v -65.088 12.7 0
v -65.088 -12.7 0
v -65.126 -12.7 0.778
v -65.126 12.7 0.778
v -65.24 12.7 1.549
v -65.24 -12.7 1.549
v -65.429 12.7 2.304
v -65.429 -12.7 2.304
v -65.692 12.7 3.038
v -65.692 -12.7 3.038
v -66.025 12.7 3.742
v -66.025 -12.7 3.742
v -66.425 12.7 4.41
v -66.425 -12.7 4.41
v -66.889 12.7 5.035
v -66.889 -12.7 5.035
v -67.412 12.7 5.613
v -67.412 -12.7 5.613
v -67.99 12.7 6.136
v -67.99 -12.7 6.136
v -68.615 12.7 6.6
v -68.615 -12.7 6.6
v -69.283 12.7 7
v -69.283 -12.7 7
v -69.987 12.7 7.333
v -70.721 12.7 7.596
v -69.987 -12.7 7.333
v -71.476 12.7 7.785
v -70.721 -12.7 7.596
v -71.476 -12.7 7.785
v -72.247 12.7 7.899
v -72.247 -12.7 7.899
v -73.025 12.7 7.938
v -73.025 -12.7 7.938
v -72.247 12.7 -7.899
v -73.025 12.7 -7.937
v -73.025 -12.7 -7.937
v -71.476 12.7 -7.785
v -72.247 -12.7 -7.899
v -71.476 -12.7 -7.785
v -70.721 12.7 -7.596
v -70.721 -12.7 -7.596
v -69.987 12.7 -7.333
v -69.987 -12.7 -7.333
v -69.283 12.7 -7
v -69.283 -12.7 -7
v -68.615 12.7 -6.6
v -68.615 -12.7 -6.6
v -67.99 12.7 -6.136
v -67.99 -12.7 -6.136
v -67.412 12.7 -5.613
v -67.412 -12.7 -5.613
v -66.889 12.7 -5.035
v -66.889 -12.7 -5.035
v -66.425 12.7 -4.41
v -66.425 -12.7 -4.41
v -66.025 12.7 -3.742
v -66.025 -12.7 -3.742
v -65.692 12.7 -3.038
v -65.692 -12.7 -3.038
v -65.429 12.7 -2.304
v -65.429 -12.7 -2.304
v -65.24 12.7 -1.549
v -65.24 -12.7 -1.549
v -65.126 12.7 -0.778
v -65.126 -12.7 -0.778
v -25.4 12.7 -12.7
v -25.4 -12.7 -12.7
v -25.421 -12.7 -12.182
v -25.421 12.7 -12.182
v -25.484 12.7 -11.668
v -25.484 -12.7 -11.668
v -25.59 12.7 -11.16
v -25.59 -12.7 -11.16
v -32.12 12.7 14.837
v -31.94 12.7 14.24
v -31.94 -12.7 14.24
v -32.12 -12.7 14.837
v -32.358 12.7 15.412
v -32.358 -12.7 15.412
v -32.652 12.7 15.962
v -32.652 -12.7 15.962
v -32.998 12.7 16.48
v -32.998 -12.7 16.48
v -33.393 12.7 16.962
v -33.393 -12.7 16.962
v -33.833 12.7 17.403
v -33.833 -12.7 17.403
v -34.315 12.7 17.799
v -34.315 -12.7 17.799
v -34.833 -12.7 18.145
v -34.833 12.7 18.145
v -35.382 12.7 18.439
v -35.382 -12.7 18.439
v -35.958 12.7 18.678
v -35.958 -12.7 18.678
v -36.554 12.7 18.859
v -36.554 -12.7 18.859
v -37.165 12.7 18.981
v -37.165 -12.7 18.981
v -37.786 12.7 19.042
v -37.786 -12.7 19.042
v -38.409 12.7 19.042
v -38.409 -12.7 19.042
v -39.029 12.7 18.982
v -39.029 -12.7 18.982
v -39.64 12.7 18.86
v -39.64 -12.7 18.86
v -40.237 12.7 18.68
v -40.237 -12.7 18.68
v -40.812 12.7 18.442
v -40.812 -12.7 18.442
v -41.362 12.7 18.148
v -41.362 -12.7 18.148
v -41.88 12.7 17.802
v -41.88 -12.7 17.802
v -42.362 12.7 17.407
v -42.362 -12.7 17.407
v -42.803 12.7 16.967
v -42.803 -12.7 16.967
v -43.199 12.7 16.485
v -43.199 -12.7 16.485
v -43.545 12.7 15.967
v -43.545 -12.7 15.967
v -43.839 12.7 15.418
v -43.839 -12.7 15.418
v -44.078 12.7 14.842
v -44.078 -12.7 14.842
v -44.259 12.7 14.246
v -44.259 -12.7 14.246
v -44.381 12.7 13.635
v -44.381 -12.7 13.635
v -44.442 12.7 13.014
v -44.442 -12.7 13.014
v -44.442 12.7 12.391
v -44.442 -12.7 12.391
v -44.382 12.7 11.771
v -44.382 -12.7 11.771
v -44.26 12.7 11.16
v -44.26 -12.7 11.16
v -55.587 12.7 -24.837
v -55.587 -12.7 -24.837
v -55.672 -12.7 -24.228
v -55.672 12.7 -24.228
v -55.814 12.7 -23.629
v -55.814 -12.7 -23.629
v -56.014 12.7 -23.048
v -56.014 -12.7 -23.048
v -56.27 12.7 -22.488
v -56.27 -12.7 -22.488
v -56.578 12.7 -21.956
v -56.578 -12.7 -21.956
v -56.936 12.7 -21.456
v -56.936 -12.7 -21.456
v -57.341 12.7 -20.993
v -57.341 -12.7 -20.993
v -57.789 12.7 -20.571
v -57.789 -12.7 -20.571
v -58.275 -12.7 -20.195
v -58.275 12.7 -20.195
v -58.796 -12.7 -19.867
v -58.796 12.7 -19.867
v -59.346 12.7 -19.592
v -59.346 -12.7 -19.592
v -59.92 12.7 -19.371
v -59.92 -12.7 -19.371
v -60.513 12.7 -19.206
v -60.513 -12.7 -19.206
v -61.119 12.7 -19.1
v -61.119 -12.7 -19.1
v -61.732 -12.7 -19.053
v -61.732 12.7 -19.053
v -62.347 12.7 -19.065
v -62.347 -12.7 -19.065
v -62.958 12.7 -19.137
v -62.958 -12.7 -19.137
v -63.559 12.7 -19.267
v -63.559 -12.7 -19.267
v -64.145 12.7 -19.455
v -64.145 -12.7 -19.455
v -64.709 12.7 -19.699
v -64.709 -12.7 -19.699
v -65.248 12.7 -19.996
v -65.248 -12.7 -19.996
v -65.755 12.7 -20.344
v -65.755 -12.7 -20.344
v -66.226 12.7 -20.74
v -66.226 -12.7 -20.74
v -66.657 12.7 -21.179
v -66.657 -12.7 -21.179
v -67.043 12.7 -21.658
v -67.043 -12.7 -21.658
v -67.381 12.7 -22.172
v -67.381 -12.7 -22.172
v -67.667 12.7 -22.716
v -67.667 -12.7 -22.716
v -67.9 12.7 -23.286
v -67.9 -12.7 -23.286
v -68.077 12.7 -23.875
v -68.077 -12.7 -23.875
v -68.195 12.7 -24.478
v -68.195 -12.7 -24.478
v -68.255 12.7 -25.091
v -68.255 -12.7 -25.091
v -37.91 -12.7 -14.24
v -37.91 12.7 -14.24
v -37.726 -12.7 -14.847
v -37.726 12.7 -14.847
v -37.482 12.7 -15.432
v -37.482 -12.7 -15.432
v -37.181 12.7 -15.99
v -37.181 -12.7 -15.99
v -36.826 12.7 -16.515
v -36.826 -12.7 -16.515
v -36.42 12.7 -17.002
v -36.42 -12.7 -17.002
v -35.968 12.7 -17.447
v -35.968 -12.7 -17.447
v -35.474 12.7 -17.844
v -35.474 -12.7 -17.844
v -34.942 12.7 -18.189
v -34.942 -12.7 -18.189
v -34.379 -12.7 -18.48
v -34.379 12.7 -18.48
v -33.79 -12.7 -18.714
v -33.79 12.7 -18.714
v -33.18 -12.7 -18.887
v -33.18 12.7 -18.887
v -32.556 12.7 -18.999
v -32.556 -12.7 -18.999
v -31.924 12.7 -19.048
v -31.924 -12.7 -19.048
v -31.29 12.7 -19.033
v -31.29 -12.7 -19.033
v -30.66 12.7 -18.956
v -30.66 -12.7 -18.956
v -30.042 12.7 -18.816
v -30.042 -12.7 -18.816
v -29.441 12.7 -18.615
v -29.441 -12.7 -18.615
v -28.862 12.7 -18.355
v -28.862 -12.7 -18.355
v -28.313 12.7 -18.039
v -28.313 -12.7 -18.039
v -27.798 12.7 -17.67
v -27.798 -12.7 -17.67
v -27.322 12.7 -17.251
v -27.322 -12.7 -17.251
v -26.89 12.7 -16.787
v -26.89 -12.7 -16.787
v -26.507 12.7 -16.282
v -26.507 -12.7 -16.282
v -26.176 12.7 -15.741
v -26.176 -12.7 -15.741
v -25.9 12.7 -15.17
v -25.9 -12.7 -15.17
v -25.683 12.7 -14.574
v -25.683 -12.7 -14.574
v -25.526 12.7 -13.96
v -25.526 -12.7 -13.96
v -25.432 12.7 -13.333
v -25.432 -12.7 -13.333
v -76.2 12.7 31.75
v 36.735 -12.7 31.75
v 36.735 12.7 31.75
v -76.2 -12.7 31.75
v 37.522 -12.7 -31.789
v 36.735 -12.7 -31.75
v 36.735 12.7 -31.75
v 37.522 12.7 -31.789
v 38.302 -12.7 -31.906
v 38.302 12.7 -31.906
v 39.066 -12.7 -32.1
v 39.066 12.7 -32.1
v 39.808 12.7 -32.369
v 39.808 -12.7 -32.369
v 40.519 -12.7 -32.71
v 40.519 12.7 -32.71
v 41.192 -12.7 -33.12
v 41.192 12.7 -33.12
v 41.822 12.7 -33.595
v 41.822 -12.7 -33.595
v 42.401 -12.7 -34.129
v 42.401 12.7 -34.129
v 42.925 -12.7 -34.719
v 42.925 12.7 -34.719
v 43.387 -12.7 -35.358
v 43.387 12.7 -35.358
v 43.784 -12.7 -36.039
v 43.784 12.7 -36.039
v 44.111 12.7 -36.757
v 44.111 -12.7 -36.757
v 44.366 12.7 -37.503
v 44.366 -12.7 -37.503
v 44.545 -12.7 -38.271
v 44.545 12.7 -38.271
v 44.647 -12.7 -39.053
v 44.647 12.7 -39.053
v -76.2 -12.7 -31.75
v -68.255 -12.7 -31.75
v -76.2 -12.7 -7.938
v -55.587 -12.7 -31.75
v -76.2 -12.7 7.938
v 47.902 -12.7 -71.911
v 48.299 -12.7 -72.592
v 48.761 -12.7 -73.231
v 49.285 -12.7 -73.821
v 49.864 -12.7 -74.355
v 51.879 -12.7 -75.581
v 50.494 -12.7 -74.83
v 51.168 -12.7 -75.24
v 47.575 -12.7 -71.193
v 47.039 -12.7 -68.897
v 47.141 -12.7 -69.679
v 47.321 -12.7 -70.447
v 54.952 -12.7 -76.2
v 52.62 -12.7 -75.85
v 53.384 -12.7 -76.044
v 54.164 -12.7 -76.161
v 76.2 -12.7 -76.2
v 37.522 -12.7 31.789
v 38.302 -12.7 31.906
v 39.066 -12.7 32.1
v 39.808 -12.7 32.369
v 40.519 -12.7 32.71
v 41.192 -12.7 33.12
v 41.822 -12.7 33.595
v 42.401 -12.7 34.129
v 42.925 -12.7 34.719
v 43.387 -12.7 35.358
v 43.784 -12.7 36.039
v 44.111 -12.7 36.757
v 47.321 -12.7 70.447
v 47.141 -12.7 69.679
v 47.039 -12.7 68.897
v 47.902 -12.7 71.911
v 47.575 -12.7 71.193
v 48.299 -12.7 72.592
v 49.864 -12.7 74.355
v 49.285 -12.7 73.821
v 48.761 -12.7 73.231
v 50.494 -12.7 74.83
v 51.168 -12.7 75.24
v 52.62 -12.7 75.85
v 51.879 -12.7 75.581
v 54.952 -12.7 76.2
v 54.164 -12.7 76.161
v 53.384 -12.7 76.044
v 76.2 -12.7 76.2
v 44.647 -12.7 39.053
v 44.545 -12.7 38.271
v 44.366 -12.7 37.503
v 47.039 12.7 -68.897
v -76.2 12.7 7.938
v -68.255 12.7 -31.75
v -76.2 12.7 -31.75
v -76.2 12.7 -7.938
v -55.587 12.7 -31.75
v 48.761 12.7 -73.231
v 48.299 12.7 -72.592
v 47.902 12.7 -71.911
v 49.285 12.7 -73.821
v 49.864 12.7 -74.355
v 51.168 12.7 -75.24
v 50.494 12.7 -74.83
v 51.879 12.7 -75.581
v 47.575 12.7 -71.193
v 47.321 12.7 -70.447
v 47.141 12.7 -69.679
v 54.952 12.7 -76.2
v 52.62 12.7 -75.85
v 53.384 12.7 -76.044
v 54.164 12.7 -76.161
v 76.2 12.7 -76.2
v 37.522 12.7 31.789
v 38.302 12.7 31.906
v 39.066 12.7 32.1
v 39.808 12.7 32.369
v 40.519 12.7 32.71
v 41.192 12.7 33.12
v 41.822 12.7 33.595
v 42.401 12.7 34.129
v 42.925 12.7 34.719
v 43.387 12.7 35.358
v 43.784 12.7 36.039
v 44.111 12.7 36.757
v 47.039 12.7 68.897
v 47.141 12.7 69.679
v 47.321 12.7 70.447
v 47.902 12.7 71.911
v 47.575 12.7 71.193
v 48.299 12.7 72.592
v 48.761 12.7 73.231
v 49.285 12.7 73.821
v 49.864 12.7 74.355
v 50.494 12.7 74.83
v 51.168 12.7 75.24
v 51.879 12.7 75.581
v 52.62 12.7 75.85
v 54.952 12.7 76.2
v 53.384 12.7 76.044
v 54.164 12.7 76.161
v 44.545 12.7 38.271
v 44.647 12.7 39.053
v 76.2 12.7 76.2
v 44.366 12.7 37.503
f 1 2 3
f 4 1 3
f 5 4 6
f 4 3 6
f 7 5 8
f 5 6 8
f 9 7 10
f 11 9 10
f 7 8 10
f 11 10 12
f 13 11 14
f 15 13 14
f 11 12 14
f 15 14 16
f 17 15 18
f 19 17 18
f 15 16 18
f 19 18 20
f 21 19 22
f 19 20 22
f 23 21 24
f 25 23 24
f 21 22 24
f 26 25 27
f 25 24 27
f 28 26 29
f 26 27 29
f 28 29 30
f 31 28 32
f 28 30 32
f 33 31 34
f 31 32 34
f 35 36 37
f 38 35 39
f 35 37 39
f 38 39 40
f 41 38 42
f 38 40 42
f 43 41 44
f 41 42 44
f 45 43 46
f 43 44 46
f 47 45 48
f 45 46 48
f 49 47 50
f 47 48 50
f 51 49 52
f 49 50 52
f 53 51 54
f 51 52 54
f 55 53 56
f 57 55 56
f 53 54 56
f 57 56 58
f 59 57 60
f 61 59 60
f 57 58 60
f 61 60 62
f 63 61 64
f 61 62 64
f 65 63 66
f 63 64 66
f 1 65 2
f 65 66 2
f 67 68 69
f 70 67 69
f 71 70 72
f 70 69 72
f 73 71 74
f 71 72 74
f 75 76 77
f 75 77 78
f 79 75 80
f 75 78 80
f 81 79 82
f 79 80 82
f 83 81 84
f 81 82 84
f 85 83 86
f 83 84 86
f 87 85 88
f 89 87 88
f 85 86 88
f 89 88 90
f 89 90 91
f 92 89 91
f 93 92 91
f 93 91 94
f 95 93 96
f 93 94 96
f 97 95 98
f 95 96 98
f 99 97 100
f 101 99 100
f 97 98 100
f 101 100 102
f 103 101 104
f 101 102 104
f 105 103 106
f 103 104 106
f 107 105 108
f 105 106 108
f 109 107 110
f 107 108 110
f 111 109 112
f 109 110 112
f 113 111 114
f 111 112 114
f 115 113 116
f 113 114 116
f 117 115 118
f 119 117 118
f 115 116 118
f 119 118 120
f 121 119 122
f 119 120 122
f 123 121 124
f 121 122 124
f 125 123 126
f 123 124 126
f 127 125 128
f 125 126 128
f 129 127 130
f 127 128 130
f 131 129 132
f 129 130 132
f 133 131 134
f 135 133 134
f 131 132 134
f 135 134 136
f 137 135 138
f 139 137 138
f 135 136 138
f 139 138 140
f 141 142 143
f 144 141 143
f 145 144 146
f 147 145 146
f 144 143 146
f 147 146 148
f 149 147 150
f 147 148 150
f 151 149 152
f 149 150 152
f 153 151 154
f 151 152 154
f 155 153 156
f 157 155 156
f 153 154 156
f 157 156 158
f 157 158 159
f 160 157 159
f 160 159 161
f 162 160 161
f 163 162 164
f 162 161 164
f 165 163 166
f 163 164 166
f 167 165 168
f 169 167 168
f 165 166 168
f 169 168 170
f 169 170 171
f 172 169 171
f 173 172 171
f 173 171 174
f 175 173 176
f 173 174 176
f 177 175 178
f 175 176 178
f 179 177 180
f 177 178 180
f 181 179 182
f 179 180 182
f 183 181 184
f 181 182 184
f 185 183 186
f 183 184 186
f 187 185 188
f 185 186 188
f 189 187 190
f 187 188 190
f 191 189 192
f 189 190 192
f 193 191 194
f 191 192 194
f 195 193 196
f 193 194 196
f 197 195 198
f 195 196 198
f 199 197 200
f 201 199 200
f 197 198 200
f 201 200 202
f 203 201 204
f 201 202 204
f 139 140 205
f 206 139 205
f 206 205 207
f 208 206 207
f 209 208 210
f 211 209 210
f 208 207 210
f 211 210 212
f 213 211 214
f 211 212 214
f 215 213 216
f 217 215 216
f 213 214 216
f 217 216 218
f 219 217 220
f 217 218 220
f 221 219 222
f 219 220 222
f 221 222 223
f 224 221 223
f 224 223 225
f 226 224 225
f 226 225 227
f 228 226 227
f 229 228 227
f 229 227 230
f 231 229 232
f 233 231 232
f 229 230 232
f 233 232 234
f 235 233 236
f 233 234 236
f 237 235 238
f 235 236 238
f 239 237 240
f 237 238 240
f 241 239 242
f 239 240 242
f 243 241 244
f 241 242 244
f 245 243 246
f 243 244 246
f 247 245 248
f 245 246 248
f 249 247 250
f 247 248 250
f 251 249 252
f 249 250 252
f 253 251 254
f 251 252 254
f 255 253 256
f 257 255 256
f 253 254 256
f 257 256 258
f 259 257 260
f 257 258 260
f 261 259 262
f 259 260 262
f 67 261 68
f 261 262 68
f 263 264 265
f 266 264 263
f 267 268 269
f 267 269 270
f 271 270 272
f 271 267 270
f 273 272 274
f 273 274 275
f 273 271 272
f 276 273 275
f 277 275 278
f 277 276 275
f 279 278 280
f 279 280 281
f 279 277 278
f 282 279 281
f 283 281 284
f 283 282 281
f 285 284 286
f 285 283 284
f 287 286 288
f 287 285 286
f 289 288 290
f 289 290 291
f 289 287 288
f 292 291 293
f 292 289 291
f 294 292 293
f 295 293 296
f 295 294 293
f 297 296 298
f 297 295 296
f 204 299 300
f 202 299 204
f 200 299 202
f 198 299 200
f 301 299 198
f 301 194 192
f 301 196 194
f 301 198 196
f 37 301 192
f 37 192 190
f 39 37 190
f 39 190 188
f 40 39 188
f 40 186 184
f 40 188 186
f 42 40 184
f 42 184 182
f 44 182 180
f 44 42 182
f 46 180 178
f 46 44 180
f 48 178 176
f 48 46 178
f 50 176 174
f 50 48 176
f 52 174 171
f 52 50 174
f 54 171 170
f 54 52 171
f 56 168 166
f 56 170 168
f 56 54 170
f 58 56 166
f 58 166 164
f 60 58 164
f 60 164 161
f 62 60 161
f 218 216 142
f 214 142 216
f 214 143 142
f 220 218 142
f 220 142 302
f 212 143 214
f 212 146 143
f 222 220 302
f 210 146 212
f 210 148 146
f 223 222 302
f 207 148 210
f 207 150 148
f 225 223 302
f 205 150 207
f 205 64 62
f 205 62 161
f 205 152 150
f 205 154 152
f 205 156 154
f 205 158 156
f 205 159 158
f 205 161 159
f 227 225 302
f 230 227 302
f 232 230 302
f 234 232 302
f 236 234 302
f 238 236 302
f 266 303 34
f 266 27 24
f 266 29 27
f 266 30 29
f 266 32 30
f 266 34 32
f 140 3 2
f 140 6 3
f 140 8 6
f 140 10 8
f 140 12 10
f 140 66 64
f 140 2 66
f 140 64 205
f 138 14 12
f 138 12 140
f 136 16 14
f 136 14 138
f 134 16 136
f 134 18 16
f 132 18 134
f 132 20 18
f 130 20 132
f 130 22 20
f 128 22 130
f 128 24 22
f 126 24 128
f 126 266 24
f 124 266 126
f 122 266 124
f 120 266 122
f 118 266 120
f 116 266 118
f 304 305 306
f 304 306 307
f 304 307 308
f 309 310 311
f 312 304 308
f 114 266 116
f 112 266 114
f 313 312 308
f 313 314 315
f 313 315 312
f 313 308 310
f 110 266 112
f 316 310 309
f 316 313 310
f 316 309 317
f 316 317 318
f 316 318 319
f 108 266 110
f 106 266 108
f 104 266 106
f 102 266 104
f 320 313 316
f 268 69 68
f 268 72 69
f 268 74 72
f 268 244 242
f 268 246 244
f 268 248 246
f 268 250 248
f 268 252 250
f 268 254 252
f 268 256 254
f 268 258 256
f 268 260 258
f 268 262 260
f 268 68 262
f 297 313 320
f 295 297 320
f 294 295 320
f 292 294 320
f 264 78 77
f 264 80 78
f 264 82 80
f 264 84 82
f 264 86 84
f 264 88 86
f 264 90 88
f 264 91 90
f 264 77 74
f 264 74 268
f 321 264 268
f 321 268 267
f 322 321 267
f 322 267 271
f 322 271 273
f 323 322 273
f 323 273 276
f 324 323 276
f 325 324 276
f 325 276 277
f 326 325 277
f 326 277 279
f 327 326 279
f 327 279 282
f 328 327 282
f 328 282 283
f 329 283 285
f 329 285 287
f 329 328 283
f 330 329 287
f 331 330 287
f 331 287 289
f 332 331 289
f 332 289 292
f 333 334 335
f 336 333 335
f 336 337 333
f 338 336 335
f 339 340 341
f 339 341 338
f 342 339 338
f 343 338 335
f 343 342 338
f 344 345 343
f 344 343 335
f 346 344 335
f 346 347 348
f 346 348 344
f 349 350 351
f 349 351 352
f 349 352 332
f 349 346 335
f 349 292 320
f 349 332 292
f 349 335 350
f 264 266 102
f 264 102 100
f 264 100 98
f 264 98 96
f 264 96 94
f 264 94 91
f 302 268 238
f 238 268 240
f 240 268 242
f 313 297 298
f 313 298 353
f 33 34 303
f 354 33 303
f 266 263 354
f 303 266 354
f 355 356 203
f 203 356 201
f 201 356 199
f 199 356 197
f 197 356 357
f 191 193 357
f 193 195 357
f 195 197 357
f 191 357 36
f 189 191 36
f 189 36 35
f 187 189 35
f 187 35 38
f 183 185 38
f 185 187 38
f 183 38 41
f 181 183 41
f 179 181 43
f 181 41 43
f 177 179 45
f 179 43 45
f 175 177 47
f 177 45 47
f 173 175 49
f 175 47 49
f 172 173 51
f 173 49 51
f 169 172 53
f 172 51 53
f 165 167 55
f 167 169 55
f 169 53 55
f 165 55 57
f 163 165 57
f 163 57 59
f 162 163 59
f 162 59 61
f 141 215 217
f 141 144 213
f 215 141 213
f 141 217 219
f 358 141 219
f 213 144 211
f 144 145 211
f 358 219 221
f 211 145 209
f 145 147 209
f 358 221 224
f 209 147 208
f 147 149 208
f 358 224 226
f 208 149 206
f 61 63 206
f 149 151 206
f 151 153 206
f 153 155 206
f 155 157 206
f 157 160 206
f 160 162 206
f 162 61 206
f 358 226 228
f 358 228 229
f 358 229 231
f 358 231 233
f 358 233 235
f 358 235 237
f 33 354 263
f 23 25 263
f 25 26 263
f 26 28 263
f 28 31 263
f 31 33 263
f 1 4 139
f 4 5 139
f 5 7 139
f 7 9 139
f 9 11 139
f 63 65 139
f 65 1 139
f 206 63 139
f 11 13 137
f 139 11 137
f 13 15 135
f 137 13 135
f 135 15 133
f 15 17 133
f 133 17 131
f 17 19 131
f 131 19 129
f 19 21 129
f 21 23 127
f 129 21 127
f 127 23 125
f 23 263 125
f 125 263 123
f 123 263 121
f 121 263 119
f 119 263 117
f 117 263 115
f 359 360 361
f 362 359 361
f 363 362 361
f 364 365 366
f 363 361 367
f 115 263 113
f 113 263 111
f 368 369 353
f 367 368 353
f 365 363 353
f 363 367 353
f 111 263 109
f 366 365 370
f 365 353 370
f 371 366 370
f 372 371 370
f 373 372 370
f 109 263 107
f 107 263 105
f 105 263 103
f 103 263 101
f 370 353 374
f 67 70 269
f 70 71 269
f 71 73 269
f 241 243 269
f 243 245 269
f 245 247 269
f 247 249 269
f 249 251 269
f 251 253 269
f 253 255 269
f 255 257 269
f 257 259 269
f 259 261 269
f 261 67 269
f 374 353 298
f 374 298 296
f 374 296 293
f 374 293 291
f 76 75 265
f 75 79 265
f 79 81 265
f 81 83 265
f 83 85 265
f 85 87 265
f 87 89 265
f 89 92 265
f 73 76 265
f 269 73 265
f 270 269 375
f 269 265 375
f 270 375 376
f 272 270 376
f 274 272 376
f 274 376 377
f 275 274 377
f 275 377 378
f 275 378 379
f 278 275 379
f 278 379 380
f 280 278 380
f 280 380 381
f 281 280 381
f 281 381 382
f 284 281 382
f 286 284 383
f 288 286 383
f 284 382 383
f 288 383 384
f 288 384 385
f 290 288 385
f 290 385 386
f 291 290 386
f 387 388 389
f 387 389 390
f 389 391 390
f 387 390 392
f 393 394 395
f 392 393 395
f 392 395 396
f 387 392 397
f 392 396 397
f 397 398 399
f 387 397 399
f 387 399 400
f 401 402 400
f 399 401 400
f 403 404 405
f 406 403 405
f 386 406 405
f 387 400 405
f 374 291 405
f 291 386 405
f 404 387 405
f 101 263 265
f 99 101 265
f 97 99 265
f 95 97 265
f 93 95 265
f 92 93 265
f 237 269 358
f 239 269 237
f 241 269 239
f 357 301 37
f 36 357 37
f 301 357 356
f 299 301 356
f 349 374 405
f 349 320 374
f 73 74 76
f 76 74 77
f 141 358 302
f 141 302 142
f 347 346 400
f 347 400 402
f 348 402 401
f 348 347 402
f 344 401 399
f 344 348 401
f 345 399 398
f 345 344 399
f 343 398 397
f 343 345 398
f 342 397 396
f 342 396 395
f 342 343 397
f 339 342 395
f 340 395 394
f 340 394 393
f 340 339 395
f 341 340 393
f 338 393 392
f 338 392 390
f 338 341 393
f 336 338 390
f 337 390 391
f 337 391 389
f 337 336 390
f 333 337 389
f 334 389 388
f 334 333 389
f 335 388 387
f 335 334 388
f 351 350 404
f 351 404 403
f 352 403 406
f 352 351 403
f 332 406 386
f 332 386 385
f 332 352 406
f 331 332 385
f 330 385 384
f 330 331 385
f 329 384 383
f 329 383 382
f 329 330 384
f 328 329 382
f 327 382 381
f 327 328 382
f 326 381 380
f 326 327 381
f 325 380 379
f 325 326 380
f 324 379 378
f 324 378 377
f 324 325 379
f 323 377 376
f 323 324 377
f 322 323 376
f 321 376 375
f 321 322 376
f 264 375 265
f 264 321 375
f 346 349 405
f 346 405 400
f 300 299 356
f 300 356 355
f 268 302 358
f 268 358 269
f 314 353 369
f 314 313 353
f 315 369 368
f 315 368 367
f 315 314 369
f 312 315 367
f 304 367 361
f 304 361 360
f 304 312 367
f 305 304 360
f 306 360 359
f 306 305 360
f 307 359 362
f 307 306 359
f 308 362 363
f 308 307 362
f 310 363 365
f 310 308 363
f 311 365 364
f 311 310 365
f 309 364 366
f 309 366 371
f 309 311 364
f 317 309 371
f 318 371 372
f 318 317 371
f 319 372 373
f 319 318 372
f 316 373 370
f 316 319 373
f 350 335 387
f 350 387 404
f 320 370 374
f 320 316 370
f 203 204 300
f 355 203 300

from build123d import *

# Parameters (mm, degrees)
F1_DEPTH = 12.7
F3_DEPTH = 25.401
F5_DEPTH = 25.4


with BuildPart() as f1:
    # F0 (on Front) → F1 (new body, symmetric)
    with BuildSketch(Plane.XZ):
        with BuildLine():
            Line((76.2, -76.2), (76.2, 0))
            Line((76.2, 0), (76.2, 76.2))
            Line((76.2, 76.2), (54.9515881949, 76.2))
            ThreePointArc((54.9515881949, 76.2), (49.567872747, 74.095124986), (47.0394765128, 68.8968461044))
            Line((47.0394765128, 68.8968461044), (44.6467865895, 39.0531538956))
            ThreePointArc((44.6467865895, 39.0531538956), (42.1183903553, 33.854875014), (36.7346749074, 31.75))
            Line((36.7346749074, 31.75), (-76.2, 31.75))
            Line((-76.2, 31.75), (-76.2, 0))
            Line((-76.2, 0), (-76.2, -31.75))
            Line((-76.2, -31.75), (36.7346749074, -31.75))
            ThreePointArc((36.7346749074, -31.75), (42.1183903553, -33.854875014), (44.6467865895, -39.0531538956))
            Line((44.6467865895, -39.0531538956), (47.0394765128, -68.8968461044))
            ThreePointArc((47.0394765128, -68.8968461044), (49.567872747, -74.095124986), (54.9515881949, -76.2))
            Line((54.9515881949, -76.2), (76.2, -76.2))
        make_face()
    extrude(amount=F1_DEPTH, both=True)

    # F2 (on face) → F3 (cut, through all)
    with BuildSketch(Plane.XZ.offset(12.7)):
        with BuildLine():
            ThreePointArc((-65.0875, 0), (-67.4123399243, 5.6126600757), (-73.025, 7.9375))
            Line((-73.025, 7.9375), (-76.2, 7.9375))
            Line((-76.2, 7.9375), (-76.2, -7.9375))
            Line((-76.2, -7.9375), (-73.025, -7.9375))
            ThreePointArc((-73.025, -7.9375), (-67.4123399243, -5.6126600757), (-65.0875, 0))
        make_face()
    extrude(amount=-F3_DEPTH, mode=Mode.SUBTRACT)

    # F4 (on face) → F5 (cut)
    with BuildSketch(Plane.XZ.offset(12.7)):
        with BuildLine():
            ThreePointArc((-25.4, -12.7), (-25.4475770151, -11.9241362755), (-25.5895951241, -11.159898781))
            ThreePointArc((-25.5895951241, -11.159898781), (-33.290101219, -6.5395951241), (-37.9104048759, -14.240101219))
            ThreePointArc((-37.9104048759, -14.240101219), (-30.9741362755, -19.0024229849), (-25.4, -12.7))
        make_face()
        with BuildLine():
            ThreePointArc((-31.9395951241, 14.240101219), (-31.7975770151, 13.4758637245), (-31.75, 12.7))
            ThreePointArc((-31.75, 12.7), (-37.3241362755, 6.3975770151), (-44.2604048759, 11.159898781))
            Line((-44.2604048759, 11.159898781), (-37.9104048759, -14.240101219))
            ThreePointArc((-37.9104048759, -14.240101219), (-33.290101219, -6.5395951241), (-25.5895951241, -11.159898781))
            Line((-25.5895951241, -11.159898781), (-31.9395951241, 14.240101219))
        make_face()
        with BuildLine():
            ThreePointArc((-44.2604048759, 11.159898781), (-37.3241362755, 6.3975770151), (-31.75, 12.7))
            ThreePointArc((-31.75, 12.7), (-31.7975770151, 13.4758637245), (-31.9395951241, 14.240101219))
            ThreePointArc((-31.9395951241, 14.240101219), (-39.640101219, 18.8604048759), (-44.2604048759, 11.159898781))
        make_face()
        with BuildLine():
            Line((-55.5874992575, -31.75), (-55.5874992575, -24.8370918305))
            ThreePointArc((-55.5874992575, -24.8370918305), (-62.0395651932, -19.0512714315), (-68.2549589201, -25.0906218393))
            Line((-68.2549589201, -25.0906218393), (-68.2549589201, -31.75))
            Line((-68.2549589201, -31.75), (-55.5874992575, -31.75))
        make_face()
    extrude(amount=-F5_DEPTH, mode=Mode.SUBTRACT)


solid = f1.part
